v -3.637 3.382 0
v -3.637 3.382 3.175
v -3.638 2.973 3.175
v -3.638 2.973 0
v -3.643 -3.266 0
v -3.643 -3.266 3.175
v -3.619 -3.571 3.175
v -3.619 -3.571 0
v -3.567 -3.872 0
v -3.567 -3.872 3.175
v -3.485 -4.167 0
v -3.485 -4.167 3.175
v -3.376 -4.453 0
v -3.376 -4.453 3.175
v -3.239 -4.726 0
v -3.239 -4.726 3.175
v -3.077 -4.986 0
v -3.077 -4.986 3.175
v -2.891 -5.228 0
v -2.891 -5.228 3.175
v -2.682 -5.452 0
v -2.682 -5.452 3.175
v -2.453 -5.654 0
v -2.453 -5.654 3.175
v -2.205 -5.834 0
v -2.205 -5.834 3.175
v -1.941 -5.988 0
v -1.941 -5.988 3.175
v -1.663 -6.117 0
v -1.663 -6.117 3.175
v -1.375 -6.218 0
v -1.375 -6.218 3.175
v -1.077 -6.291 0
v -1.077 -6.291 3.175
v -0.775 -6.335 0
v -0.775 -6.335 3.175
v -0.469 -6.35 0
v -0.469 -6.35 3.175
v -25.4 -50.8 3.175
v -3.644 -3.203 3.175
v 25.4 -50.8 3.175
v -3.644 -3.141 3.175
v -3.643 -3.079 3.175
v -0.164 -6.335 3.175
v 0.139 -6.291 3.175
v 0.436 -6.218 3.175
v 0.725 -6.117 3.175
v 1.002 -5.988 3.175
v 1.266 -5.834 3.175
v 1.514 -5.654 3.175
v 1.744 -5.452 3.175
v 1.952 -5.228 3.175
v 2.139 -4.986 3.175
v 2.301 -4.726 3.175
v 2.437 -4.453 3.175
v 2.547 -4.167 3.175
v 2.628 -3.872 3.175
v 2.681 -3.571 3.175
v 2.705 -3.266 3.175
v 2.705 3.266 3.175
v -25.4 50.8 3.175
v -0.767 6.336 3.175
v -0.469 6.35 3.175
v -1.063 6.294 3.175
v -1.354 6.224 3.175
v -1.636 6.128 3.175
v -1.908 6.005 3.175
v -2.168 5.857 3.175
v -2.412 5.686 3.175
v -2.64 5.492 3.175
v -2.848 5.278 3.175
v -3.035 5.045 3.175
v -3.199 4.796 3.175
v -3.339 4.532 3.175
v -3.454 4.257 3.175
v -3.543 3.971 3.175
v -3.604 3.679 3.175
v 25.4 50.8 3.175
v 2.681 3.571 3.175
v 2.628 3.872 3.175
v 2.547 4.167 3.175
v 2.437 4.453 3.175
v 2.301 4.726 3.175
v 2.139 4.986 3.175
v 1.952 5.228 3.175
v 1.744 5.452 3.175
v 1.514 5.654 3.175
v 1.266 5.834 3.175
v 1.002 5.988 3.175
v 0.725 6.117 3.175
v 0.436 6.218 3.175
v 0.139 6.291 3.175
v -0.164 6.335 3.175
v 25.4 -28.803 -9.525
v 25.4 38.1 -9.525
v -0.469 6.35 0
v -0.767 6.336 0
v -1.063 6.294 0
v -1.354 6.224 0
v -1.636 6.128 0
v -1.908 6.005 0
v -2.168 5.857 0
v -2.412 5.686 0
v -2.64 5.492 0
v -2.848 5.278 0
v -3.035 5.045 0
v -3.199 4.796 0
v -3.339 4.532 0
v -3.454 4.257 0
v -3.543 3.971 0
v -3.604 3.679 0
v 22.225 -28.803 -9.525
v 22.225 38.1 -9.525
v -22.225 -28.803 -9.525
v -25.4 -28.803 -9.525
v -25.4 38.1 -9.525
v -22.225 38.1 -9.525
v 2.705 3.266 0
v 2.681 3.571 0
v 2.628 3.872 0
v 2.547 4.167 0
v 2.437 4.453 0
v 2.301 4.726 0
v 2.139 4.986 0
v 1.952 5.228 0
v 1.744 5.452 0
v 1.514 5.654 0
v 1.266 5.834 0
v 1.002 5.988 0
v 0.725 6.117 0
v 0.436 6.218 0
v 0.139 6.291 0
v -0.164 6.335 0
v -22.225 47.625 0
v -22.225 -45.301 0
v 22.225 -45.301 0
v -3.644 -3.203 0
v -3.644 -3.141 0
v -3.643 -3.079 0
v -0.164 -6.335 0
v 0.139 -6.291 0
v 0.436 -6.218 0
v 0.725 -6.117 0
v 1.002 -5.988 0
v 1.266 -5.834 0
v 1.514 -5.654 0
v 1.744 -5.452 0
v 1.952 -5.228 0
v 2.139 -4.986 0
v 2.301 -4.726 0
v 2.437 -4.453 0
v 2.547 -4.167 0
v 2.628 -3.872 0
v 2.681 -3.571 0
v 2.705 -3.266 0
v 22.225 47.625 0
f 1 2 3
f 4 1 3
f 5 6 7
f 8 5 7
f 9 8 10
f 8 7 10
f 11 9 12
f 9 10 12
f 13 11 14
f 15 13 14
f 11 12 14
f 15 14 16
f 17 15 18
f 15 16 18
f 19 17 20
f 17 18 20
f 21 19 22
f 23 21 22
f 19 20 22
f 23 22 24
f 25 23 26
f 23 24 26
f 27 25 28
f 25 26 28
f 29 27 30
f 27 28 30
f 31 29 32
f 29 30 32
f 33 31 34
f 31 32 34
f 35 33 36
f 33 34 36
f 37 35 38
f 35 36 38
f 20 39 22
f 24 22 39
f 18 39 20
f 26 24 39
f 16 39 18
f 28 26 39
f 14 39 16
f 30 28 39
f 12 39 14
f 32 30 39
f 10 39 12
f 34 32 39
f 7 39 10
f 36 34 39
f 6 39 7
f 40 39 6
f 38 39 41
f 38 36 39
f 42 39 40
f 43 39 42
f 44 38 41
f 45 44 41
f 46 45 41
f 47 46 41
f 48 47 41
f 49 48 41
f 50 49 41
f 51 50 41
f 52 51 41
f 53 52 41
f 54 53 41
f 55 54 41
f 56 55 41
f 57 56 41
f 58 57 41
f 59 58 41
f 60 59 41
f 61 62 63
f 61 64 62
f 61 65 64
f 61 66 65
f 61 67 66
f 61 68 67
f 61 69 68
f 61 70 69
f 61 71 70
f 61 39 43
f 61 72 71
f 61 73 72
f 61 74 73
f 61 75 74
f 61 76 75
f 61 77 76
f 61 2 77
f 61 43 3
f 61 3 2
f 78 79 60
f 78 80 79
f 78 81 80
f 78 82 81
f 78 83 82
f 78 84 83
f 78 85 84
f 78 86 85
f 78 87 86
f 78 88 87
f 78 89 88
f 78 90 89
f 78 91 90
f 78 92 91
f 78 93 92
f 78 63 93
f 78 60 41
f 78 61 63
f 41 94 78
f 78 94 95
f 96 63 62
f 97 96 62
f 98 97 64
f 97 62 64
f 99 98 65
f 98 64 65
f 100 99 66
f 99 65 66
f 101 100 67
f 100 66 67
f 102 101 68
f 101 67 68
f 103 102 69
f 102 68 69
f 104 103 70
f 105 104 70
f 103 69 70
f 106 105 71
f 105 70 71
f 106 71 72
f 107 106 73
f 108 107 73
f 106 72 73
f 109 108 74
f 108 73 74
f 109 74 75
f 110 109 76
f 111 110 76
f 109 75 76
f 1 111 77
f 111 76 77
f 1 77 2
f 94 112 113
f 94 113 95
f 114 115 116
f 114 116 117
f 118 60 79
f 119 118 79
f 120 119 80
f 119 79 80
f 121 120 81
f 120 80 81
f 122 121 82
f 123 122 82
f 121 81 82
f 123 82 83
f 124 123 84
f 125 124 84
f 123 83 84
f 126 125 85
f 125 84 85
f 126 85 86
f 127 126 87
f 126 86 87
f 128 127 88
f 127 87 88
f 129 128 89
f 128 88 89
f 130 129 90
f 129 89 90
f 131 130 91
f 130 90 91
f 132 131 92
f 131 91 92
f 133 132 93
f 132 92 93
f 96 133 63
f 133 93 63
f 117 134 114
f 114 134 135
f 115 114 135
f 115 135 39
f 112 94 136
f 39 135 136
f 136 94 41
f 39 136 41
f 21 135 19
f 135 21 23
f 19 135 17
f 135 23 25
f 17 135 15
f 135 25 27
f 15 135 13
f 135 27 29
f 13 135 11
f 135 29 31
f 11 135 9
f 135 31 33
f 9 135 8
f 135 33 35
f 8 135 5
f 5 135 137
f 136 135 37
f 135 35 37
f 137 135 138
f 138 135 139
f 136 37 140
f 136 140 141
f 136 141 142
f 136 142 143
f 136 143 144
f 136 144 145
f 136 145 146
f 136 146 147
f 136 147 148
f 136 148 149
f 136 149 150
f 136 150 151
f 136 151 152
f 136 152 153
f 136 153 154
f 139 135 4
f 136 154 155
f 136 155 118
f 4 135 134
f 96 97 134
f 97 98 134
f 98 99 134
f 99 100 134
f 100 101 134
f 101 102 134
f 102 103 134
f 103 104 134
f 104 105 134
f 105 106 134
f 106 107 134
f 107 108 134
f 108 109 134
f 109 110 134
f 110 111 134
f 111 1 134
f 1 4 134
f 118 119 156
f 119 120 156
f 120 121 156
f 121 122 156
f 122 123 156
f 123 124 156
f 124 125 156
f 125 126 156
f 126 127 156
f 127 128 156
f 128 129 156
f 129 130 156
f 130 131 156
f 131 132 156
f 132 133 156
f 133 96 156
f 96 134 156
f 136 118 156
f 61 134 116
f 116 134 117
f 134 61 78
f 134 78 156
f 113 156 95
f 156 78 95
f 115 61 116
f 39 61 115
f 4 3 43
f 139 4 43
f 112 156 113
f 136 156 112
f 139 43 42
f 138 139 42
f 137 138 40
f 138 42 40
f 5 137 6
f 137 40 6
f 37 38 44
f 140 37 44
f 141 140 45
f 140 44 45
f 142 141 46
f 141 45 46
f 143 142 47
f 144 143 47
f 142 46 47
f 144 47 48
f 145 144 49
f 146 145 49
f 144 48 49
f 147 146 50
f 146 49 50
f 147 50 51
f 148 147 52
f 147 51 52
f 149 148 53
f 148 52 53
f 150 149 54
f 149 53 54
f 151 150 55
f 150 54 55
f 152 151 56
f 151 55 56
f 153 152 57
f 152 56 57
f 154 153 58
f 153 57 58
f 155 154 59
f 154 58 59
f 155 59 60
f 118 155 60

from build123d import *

# Parameters (mm, degrees)
F0_W     = 50.8
F0_H     = 101.6
F1_DEPTH = 3.175
F2_W     = 3.175
F2_H     = 101.6
F3_DEPTH = 9.525
F5_DEPTH = 50.8
F7_DEPTH = 25.4


with BuildPart() as f1:
    # F0 (on Top) → F1 (new body)
    with BuildSketch(Plane.XY):
        Rectangle(F0_W, F0_H)
    extrude(amount=F1_DEPTH)

    # F2 (on face) → F3 (join)
    with BuildSketch(Plane(origin=(0, 0, 0), x_dir=(1, 0, 0), z_dir=(0, 0, -1))):
        with Locations((-23.8125, 0)):
            Rectangle(F2_W, F2_H)
        with Locations((23.8125, 0)):
            Rectangle(F2_W, F2_H)
    extrude(amount=F3_DEPTH)

    # F4 (on face) → F5 (cut)
    with BuildSketch(Plane.YZ.offset(25.4)):
        Polygon((-28.8029547439, -9.525), (-50.8, 3.175), (-50.8, -9.525), align=None)
        Polygon((50.8, -9.525), (50.8, 3.175), (38.1, -9.525), align=None)
    extrude(amount=-F5_DEPTH, mode=Mode.SUBTRACT)

    # F6 (on face) → F7 (cut)
    with BuildSketch(Plane.XY.offset(3.175)):
        with BuildLine():
            Line((-0.4691980296, 0), (-0.4691980296, 6.35))
            ThreePointArc((-0.4691980296, 6.35), (-2.639728339, 5.492201583), (-3.6374224509, 3.3823138118))
            Line((-3.6374224509, 3.3823138118), (-3.6377601108, 2.9729125496))
            ThreePointArc((-3.6377601108, 2.9729125496), (-2.6416387475, 0.8595893825), (-0.4691980296, 0))
        make_face()
        with BuildLine():
            ThreePointArc((2.7045093513, 3.2655895149), (1.7436059936, 5.4518670042), (-0.4691980296, 6.35))
            Line((-0.4691980296, 6.35), (-0.4691980296, 0))
            ThreePointArc((-0.4691980296, 0), (1.7436059936, 0.8981329958), (2.7045093513, 3.0844104851))
            Line((2.7045093513, 3.0844104851), (2.7045093513, 3.2655895149))
        make_face()
        with BuildLine():
            Line((-0.4691980296, 0), (-0.4691980296, -6.35))
            ThreePointArc((-0.4691980296, -6.35), (1.7436059936, -5.4518670042), (2.7045093513, -3.2655895149))
            Line((2.7045093513, -3.2655895149), (2.7045093513, -3.0844104851))
            ThreePointArc((2.7045093513, -3.0844104851), (1.7436059936, -0.8981329958), (-0.4691980296, 0))
        make_face()
        with BuildLine():
            ThreePointArc((-3.6429054106, -3.2655895149), (-2.6820020528, -5.4518670042), (-0.4691980296, -6.35))
            Line((-0.4691980296, -6.35), (-0.4691980296, 0))
            ThreePointArc((-0.4691980296, 0), (-2.6801234201, -0.8963087269), (-3.6427516628, -3.0791754847))
            Line((-3.6427516628, -3.0791754847), (-3.6429054106, -3.2655895149))
        make_face()
        with BuildLine():
            ThreePointArc((-3.6427516628, -3.0791754847), (-3.6441969498, -3.1723813712), (-3.6429054106, -3.2655895149))
            Line((-3.6429054106, -3.2655895149), (-3.6427516628, -3.0791754847))
        make_face()
        with BuildLine():
            ThreePointArc((2.7045093513, 3.0844104851), (1.7436059936, 0.8981329958), (-0.4691980296, 0))
            ThreePointArc((-0.4691980296, 0), (1.7436059936, -0.8981329958), (2.7045093513, -3.0844104851))
            Line((2.7045093513, -3.0844104851), (2.7045093513, 3.0844104851))
        make_face()
        with BuildLine():
            ThreePointArc((-3.6427516628, -3.0791754847), (-2.6801234201, -0.8963087269), (-0.4691980296, 0))
            ThreePointArc((-0.4691980296, 0), (-2.6416387475, 0.8595893825), (-3.6377601108, 2.9729125496))
            Line((-3.6377601108, 2.9729125496), (-3.6427516628, -3.0791754847))
        make_face()
    extrude(amount=-F7_DEPTH, mode=Mode.SUBTRACT)


solid = f1.part
